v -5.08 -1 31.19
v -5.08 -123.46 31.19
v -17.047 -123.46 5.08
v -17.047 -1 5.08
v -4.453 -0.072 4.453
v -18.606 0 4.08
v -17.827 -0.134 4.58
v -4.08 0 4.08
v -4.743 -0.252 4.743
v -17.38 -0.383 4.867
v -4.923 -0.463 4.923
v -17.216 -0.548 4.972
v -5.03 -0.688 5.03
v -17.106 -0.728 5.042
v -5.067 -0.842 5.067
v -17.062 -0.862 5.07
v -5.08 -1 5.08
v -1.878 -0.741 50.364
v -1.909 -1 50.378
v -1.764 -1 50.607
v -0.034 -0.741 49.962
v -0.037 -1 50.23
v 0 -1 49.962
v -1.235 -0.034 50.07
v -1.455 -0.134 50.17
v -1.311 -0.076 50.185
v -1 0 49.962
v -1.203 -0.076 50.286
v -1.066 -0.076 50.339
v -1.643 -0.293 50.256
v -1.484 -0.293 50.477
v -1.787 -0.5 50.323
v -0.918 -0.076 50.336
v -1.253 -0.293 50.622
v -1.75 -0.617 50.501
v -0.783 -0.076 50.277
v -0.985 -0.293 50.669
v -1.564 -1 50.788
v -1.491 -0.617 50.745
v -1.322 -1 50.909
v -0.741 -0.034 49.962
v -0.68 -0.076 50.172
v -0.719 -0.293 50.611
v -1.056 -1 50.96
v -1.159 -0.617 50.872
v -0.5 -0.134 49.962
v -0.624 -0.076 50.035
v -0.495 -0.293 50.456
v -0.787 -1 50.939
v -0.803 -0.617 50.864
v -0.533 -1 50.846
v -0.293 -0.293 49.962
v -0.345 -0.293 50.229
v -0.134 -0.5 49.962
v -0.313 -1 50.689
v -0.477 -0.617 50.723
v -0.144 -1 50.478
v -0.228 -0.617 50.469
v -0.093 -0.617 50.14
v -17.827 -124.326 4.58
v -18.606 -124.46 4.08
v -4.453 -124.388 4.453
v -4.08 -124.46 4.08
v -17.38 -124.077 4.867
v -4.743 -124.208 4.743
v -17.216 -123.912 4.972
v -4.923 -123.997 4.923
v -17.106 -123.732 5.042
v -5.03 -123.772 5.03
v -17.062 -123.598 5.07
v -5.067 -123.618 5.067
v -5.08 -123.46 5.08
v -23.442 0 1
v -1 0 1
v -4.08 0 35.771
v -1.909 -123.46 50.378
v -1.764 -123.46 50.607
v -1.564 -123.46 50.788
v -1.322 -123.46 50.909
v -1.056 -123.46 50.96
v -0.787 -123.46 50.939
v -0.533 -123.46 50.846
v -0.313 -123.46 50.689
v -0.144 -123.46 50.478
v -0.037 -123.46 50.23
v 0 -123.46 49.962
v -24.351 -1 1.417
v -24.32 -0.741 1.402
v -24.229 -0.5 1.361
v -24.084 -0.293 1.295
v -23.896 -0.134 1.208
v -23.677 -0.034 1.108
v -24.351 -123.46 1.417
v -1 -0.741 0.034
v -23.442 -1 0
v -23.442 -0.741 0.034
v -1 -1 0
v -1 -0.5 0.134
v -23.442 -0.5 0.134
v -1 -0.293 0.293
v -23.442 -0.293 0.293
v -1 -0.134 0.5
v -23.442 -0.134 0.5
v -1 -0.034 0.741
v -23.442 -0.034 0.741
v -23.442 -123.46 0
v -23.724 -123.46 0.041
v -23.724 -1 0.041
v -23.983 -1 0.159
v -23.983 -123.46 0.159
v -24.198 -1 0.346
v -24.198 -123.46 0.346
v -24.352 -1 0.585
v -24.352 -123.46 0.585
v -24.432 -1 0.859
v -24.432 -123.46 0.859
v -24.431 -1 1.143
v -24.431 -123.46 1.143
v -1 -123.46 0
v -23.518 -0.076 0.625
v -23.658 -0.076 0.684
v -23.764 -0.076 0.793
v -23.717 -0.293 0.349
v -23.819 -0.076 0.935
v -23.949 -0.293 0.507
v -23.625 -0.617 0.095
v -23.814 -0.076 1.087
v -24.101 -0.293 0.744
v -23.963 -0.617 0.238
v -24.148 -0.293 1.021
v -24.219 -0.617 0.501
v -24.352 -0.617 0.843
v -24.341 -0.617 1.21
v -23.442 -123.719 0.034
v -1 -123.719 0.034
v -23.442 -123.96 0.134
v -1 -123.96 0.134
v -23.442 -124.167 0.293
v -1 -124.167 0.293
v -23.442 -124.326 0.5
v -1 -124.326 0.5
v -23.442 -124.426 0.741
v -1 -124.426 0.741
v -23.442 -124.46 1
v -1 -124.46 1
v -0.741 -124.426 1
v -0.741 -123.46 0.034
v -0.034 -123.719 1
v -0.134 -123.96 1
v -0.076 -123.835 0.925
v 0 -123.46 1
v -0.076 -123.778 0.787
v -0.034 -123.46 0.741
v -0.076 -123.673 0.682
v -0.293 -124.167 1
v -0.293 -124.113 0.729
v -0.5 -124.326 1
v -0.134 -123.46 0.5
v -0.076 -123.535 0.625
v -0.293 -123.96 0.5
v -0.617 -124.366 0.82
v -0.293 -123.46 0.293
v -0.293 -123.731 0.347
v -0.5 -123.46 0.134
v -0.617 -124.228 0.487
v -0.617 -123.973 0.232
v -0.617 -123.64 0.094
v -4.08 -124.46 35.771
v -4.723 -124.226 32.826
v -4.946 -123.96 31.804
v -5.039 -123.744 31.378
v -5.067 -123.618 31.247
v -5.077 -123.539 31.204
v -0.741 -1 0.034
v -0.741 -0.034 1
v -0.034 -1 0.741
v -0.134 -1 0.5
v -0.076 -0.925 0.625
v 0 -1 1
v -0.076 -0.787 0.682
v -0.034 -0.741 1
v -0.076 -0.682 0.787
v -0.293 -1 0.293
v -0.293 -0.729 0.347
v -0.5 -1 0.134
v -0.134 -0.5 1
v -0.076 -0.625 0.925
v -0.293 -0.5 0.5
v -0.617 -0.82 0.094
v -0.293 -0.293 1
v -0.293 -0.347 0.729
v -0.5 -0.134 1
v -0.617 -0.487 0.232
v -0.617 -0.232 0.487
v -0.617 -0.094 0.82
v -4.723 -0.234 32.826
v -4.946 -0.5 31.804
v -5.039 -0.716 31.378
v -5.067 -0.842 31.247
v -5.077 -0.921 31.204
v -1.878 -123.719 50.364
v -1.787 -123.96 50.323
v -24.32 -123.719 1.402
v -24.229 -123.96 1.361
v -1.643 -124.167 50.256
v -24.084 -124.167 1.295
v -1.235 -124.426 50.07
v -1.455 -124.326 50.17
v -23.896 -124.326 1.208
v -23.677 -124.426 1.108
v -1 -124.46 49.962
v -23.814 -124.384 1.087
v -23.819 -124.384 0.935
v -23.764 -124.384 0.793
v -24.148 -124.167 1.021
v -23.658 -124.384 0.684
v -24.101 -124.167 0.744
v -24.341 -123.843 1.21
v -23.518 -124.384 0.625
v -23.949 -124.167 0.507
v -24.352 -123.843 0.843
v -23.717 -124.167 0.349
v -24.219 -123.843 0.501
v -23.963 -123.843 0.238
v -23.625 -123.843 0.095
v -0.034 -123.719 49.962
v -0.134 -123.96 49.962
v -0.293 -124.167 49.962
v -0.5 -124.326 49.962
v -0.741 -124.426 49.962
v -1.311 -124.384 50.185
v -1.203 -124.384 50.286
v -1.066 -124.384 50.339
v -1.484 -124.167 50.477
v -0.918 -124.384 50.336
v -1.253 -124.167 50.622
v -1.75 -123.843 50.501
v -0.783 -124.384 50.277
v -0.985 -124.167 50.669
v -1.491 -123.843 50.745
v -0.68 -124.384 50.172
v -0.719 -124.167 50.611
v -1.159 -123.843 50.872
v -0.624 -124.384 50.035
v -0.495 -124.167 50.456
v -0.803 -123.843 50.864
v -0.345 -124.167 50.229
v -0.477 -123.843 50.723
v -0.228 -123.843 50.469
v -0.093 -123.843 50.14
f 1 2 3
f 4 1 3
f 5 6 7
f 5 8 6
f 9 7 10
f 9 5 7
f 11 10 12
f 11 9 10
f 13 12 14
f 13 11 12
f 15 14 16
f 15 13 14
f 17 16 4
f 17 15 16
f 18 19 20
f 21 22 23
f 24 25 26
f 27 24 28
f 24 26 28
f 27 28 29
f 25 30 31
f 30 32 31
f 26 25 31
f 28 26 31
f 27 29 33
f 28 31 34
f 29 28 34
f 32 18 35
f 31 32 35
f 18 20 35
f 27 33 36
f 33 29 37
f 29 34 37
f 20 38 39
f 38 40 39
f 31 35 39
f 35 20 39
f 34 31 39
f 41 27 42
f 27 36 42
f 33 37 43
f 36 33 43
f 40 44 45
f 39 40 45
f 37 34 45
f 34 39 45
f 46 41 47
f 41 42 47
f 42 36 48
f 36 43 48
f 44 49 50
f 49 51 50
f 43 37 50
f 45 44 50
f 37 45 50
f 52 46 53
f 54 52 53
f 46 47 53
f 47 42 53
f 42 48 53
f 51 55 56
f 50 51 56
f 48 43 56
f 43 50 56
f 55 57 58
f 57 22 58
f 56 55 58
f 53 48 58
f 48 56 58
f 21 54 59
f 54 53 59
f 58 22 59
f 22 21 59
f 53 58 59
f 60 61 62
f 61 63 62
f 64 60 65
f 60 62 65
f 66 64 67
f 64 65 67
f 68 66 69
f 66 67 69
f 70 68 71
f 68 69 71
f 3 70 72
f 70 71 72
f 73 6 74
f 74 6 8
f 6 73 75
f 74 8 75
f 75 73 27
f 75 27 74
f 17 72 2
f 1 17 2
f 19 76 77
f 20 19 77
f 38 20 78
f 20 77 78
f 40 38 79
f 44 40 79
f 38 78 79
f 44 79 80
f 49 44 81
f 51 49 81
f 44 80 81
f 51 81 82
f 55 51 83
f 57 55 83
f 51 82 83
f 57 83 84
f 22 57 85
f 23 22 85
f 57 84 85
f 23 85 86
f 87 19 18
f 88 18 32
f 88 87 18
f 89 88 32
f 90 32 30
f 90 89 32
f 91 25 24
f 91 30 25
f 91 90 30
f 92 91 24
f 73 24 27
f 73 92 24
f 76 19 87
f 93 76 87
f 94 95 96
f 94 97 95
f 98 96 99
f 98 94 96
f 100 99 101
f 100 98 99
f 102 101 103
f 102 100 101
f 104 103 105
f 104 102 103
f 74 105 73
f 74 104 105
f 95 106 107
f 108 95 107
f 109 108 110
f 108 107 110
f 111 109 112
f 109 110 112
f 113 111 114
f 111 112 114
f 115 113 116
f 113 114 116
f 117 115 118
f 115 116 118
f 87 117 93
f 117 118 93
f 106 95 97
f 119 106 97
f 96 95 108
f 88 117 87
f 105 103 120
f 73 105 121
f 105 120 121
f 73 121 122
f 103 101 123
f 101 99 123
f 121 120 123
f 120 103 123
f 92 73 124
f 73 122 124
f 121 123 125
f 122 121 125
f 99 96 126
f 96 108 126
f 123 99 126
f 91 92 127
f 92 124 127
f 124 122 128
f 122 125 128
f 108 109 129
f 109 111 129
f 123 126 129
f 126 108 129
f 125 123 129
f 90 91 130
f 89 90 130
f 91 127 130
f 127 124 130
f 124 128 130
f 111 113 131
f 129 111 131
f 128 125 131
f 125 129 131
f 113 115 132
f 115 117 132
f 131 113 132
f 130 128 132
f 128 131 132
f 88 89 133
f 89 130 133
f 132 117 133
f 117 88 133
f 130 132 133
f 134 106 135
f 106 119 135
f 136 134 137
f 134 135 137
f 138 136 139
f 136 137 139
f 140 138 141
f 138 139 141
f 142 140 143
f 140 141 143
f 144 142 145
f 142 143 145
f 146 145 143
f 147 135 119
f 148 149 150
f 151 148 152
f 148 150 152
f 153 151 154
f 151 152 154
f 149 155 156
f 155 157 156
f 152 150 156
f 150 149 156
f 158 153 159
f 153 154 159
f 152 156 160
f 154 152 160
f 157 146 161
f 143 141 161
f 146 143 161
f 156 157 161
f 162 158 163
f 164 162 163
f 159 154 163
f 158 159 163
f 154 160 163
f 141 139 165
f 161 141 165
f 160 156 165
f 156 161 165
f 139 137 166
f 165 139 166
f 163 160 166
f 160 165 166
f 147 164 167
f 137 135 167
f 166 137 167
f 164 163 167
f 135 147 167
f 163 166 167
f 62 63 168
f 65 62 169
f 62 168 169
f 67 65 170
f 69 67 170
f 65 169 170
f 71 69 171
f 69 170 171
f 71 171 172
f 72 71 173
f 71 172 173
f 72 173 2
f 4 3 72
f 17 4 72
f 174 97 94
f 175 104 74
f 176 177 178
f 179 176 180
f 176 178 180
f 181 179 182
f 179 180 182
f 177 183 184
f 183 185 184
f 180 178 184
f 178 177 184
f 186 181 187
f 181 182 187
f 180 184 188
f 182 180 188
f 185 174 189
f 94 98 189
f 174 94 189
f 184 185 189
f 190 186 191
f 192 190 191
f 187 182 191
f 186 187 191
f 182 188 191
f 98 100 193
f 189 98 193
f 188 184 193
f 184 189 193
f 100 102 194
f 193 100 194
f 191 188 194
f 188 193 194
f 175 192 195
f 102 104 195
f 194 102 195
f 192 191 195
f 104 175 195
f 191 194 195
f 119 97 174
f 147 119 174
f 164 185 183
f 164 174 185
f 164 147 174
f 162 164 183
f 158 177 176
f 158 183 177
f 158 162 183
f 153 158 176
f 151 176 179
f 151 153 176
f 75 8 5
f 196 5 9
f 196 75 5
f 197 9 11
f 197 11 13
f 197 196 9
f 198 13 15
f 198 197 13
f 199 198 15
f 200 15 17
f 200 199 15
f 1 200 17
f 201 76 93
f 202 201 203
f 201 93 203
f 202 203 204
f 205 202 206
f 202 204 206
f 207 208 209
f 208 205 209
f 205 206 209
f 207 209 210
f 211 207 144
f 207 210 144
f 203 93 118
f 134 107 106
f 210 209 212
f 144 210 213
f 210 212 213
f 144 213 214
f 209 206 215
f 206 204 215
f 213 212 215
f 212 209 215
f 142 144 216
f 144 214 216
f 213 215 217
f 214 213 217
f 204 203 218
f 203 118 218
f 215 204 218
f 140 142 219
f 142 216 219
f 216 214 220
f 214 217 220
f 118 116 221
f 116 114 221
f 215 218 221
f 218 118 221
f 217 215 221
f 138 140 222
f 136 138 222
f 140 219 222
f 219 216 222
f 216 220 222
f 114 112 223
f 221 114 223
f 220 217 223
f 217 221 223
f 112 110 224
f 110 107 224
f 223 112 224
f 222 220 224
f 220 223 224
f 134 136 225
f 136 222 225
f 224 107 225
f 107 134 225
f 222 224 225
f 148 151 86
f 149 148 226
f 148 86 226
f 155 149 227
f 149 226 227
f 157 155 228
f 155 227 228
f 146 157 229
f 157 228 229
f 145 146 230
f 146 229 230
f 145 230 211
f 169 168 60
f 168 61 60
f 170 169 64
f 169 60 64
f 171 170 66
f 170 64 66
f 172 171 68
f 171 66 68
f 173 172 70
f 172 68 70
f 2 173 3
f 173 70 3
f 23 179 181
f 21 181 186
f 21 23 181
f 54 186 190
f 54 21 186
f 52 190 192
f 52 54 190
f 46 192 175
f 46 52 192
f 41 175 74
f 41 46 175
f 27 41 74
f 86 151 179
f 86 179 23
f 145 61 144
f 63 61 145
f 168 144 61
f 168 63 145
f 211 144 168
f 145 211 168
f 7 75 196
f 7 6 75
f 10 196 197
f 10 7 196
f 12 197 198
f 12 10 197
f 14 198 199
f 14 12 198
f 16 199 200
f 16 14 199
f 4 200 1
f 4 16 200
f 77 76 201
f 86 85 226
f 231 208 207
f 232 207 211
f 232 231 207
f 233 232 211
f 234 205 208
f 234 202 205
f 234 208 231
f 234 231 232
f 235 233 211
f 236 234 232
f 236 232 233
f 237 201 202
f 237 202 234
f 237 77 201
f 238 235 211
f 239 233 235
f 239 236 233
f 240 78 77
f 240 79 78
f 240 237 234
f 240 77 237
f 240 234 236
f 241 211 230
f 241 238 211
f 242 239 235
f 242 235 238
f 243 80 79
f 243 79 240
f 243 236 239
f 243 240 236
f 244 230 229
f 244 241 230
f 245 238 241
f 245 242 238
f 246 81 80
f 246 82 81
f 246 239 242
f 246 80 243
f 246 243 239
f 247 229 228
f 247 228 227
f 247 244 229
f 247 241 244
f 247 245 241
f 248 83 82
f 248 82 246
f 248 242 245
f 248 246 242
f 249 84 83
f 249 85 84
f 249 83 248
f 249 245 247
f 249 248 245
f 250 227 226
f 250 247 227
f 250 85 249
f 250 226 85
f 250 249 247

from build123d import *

# Parameters (mm, degrees)
F1_DEPTH = 124.46
F3_DEPTH = 124.46
F4_R     = 1


with BuildPart() as f1:
    # F0 (on Front) → F1 (new body)
    with BuildSketch(Plane.XZ):
        Polygon((-25, 0), (0, 0), (0, 54.543561), align=None)
    extrude(amount=F1_DEPTH)

    # F2 (on face) → F3 (cut, through all)
    with BuildSketch(Plane.XZ.offset(124.46)):
        Polygon((-5.08, 31.189688), (-17.047356, 5.08), (-5.08, 5.08), align=None)
    extrude(amount=-F3_DEPTH, mode=Mode.SUBTRACT)

    # F4
    f4_edges = [f1.edges().sort_by_distance(p)[0] for p in [
        (0, -62.23, 54.543561),
        (-12.5, 0, 27.27178),
        (-25, -62.23, 0),
        (-12.5, -124.46, 27.27178),
        (-12.5, -124.46, 0),
        (0, -124.46, 27.27178),
        (-11.063678, -124.46, 5.08),
        (-11.063678, -124.46, 18.134844),
        (-5.08, -124.46, 18.134844),
        (-12.5, 0, 0),
        (0, -62.23, 0),
        (-5.08, 0, 18.134844),
        (-11.063678, 0, 5.08),
        (-11.063678, 0, 18.134844),
        (0, 0, 27.27178),
    ]]
    fillet(f4_edges, radius=F4_R)


solid = f1.part
